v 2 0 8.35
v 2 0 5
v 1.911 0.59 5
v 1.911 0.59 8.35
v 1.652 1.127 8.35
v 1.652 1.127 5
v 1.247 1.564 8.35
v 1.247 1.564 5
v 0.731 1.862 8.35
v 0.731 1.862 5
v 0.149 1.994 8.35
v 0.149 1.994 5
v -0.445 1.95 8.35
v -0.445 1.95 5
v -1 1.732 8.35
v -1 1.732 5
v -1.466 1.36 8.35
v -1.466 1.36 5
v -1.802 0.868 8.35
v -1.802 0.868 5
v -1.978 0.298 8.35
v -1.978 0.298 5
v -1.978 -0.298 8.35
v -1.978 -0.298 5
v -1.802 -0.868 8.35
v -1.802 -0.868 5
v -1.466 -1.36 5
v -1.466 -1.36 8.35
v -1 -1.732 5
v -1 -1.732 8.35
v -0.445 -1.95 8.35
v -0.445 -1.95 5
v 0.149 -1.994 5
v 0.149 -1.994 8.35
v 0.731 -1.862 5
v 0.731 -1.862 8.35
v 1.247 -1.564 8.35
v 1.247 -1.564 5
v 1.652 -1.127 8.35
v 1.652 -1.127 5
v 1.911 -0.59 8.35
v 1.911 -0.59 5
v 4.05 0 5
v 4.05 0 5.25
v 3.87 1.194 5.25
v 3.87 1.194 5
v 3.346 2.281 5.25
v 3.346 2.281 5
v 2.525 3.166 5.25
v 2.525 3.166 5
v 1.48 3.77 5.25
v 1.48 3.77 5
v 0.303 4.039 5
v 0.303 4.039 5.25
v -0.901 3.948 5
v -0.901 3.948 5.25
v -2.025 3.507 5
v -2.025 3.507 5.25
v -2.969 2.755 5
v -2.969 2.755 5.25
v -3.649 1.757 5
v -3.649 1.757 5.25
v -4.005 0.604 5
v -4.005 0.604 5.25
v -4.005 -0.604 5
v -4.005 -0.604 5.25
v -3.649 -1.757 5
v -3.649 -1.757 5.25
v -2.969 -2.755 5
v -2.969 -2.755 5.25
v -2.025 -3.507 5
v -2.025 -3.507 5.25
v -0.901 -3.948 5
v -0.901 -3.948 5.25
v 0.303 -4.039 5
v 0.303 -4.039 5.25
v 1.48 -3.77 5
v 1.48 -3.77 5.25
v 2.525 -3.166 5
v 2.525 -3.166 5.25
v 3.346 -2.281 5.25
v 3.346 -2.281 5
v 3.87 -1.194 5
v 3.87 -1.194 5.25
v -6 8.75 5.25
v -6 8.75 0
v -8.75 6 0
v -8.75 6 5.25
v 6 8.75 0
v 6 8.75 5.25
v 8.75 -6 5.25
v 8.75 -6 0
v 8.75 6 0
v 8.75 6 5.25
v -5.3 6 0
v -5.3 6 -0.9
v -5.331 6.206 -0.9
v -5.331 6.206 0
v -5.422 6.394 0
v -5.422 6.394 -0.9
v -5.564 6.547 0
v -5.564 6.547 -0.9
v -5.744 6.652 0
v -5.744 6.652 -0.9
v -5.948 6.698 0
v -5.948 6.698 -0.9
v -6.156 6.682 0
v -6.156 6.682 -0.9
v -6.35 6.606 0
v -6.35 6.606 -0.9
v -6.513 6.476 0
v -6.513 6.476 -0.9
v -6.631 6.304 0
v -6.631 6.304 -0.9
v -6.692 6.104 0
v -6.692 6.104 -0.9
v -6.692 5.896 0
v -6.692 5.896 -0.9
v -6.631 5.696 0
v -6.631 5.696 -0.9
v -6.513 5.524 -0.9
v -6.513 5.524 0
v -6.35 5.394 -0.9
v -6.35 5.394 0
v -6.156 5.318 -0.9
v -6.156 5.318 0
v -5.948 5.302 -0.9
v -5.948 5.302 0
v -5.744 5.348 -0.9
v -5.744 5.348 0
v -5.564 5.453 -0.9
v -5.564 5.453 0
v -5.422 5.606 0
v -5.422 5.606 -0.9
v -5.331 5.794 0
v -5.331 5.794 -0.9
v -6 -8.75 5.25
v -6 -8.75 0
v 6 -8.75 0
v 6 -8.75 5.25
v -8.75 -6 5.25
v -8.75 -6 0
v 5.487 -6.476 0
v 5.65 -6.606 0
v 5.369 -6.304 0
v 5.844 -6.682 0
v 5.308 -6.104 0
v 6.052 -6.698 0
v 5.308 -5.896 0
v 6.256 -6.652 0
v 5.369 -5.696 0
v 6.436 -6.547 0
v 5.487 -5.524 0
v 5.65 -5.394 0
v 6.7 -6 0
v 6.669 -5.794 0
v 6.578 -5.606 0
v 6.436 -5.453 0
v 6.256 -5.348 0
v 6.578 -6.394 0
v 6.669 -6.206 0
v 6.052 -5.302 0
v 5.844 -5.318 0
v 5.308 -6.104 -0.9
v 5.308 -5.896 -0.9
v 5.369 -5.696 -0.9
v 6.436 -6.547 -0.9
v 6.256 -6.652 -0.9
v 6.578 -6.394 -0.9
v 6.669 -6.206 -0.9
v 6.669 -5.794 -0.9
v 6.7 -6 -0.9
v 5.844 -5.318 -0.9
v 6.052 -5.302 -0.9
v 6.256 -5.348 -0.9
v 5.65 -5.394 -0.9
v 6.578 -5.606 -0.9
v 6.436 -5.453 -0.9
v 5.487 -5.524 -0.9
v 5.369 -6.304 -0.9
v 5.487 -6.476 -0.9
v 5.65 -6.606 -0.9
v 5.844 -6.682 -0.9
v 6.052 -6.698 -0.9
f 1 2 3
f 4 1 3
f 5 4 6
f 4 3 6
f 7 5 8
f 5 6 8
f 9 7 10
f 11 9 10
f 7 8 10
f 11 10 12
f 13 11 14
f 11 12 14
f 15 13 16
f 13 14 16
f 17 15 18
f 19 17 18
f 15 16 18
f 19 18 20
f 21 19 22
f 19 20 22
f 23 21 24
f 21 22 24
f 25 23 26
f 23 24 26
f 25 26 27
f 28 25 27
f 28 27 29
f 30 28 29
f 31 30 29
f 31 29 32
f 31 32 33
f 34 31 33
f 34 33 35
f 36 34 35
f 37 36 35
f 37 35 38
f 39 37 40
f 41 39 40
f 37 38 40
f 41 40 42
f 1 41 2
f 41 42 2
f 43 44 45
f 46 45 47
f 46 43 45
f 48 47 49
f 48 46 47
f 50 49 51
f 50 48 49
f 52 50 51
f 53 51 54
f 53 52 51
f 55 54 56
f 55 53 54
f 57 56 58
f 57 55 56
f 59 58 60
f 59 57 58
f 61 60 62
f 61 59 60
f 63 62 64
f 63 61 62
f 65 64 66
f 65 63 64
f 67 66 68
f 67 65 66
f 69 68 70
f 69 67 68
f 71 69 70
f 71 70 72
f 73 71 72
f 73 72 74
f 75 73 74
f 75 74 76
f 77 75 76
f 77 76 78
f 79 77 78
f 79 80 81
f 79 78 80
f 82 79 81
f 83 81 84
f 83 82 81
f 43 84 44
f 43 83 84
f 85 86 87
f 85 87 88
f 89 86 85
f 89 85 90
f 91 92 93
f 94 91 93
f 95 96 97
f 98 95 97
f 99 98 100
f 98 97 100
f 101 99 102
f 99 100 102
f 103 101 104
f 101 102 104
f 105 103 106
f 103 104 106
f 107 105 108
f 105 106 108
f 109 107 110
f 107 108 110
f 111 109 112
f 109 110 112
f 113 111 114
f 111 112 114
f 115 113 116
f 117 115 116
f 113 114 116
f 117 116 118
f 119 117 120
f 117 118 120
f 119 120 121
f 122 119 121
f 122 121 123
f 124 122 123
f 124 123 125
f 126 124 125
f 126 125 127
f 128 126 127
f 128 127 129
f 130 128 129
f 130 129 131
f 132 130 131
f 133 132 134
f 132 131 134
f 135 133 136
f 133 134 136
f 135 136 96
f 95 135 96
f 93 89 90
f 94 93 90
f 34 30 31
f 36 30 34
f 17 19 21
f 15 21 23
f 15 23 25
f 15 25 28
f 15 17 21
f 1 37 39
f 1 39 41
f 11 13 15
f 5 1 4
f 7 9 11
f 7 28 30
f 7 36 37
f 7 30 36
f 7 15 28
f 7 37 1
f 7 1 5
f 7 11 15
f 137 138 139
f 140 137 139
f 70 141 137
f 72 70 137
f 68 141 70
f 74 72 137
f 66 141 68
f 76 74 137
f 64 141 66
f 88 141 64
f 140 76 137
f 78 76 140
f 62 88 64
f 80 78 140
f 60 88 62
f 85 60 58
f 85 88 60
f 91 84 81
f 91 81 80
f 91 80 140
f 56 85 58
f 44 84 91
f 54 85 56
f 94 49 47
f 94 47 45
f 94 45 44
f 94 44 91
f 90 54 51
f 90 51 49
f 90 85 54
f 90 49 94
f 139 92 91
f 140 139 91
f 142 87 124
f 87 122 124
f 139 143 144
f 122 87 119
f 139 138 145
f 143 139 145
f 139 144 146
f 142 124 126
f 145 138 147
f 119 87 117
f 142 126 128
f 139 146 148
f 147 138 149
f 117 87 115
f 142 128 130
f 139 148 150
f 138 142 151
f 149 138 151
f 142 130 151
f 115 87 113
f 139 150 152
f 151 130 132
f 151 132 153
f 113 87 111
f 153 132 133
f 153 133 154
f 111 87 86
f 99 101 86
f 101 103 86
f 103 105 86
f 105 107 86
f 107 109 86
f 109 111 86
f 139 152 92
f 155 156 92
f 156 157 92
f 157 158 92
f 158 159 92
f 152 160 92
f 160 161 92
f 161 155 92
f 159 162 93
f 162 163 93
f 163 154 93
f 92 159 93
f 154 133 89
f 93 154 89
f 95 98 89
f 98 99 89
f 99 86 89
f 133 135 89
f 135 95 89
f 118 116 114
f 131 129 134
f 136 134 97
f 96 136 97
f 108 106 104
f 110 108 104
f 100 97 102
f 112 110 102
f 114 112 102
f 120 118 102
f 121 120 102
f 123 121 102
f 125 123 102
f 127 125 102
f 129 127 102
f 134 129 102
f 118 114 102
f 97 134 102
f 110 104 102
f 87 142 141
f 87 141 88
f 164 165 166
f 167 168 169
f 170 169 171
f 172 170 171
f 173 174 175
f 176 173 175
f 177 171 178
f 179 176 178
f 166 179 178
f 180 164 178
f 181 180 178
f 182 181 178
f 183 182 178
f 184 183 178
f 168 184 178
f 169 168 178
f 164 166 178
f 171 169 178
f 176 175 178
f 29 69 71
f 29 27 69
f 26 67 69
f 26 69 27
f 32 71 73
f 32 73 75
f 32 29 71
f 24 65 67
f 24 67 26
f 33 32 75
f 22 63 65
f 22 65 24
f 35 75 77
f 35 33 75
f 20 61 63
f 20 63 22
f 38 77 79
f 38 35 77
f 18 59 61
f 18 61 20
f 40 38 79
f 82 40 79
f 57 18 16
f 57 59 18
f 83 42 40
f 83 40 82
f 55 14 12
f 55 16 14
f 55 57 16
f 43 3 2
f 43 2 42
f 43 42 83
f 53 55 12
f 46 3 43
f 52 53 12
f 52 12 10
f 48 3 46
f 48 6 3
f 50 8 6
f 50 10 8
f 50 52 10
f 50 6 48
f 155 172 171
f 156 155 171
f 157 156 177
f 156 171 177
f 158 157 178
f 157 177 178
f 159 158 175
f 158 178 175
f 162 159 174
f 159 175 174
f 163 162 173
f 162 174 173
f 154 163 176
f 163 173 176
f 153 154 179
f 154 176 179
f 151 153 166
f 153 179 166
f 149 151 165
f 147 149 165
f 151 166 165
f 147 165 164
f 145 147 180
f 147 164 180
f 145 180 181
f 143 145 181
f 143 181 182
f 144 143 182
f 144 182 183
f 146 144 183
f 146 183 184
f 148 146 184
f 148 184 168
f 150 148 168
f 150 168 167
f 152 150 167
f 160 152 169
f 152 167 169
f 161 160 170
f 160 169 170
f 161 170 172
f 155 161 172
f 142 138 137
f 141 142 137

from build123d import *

# Parameters (mm, degrees)
CYLINDER003_R     = 0.7
CYLINDER003_DEPTH = 0.9
CYLINDER002_R     = 0.7
CYLINDER002_DEPTH = 0.9
CYLINDER001_R     = 2
CYLINDER001_DEPTH = 3.35
CYLINDER_R        = 4.05
CYLINDER_DEPTH    = 2
BOX_W             = 17.5
BOX_H             = 17.5
BOX_DEPTH         = 5.25
CHAMFER_SIZE      = 2.75


with BuildPart() as jt8p_leg2:
    # Cylinder003 → Cylinder003 (new body)
    with BuildSketch(Plane(origin=(6, -6, -0.9), x_dir=(1, 0, 0), z_dir=(0, 0, 1))):
        Circle(CYLINDER003_R)
    extrude(amount=CYLINDER003_DEPTH)


with BuildPart() as jt8p_leg1:
    # Cylinder002 → Cylinder002 (new body)
    with BuildSketch(Plane(origin=(-6, 6, -0.9), x_dir=(1, 0, 0), z_dir=(0, 0, 1))):
        Circle(CYLINDER002_R)
    extrude(amount=CYLINDER002_DEPTH)


with BuildPart() as jt8p_knob:
    # Cylinder001 → Cylinder001 (new body)
    with BuildSketch(Plane.XY.offset(5)):
        Circle(CYLINDER001_R)
    extrude(amount=CYLINDER001_DEPTH)


with BuildPart() as jt8p_tophole:
    # Cylinder → Cylinder (new body)
    with BuildSketch(Plane.XY.offset(5)):
        Circle(CYLINDER_R)
    extrude(amount=CYLINDER_DEPTH)


with BuildPart() as jt8p_body:
    # Box → Box (new body)
    with BuildSketch(Plane(origin=(-8.75, -8.75, 0), x_dir=(1, 0, 0), z_dir=(0, 0, 1))):
        with Locations((8.75, 8.75)):
            Rectangle(BOX_W, BOX_H)
    extrude(amount=BOX_DEPTH)

    # Chamfer
    chamfer_edges = [jt8p_body.edges().sort_by_distance(p)[0] for p in [
        (-8.75, -8.75, 2.625),
        (-8.75, 8.75, 2.625),
        (8.75, -8.75, 2.625),
        (8.75, 8.75, 2.625),
    ]]
    chamfer(chamfer_edges, length=CHAMFER_SIZE)

    # Cut: cut JT8P_TopHole
    add(jt8p_tophole.part, mode=Mode.SUBTRACT)

    # Fusion010: union JT8P_Leg2, JT8P_Leg1, JT8P_knob
    add(jt8p_leg2.part)
    add(jt8p_leg1.part)
    add(jt8p_knob.part)


solid = jt8p_body.part
